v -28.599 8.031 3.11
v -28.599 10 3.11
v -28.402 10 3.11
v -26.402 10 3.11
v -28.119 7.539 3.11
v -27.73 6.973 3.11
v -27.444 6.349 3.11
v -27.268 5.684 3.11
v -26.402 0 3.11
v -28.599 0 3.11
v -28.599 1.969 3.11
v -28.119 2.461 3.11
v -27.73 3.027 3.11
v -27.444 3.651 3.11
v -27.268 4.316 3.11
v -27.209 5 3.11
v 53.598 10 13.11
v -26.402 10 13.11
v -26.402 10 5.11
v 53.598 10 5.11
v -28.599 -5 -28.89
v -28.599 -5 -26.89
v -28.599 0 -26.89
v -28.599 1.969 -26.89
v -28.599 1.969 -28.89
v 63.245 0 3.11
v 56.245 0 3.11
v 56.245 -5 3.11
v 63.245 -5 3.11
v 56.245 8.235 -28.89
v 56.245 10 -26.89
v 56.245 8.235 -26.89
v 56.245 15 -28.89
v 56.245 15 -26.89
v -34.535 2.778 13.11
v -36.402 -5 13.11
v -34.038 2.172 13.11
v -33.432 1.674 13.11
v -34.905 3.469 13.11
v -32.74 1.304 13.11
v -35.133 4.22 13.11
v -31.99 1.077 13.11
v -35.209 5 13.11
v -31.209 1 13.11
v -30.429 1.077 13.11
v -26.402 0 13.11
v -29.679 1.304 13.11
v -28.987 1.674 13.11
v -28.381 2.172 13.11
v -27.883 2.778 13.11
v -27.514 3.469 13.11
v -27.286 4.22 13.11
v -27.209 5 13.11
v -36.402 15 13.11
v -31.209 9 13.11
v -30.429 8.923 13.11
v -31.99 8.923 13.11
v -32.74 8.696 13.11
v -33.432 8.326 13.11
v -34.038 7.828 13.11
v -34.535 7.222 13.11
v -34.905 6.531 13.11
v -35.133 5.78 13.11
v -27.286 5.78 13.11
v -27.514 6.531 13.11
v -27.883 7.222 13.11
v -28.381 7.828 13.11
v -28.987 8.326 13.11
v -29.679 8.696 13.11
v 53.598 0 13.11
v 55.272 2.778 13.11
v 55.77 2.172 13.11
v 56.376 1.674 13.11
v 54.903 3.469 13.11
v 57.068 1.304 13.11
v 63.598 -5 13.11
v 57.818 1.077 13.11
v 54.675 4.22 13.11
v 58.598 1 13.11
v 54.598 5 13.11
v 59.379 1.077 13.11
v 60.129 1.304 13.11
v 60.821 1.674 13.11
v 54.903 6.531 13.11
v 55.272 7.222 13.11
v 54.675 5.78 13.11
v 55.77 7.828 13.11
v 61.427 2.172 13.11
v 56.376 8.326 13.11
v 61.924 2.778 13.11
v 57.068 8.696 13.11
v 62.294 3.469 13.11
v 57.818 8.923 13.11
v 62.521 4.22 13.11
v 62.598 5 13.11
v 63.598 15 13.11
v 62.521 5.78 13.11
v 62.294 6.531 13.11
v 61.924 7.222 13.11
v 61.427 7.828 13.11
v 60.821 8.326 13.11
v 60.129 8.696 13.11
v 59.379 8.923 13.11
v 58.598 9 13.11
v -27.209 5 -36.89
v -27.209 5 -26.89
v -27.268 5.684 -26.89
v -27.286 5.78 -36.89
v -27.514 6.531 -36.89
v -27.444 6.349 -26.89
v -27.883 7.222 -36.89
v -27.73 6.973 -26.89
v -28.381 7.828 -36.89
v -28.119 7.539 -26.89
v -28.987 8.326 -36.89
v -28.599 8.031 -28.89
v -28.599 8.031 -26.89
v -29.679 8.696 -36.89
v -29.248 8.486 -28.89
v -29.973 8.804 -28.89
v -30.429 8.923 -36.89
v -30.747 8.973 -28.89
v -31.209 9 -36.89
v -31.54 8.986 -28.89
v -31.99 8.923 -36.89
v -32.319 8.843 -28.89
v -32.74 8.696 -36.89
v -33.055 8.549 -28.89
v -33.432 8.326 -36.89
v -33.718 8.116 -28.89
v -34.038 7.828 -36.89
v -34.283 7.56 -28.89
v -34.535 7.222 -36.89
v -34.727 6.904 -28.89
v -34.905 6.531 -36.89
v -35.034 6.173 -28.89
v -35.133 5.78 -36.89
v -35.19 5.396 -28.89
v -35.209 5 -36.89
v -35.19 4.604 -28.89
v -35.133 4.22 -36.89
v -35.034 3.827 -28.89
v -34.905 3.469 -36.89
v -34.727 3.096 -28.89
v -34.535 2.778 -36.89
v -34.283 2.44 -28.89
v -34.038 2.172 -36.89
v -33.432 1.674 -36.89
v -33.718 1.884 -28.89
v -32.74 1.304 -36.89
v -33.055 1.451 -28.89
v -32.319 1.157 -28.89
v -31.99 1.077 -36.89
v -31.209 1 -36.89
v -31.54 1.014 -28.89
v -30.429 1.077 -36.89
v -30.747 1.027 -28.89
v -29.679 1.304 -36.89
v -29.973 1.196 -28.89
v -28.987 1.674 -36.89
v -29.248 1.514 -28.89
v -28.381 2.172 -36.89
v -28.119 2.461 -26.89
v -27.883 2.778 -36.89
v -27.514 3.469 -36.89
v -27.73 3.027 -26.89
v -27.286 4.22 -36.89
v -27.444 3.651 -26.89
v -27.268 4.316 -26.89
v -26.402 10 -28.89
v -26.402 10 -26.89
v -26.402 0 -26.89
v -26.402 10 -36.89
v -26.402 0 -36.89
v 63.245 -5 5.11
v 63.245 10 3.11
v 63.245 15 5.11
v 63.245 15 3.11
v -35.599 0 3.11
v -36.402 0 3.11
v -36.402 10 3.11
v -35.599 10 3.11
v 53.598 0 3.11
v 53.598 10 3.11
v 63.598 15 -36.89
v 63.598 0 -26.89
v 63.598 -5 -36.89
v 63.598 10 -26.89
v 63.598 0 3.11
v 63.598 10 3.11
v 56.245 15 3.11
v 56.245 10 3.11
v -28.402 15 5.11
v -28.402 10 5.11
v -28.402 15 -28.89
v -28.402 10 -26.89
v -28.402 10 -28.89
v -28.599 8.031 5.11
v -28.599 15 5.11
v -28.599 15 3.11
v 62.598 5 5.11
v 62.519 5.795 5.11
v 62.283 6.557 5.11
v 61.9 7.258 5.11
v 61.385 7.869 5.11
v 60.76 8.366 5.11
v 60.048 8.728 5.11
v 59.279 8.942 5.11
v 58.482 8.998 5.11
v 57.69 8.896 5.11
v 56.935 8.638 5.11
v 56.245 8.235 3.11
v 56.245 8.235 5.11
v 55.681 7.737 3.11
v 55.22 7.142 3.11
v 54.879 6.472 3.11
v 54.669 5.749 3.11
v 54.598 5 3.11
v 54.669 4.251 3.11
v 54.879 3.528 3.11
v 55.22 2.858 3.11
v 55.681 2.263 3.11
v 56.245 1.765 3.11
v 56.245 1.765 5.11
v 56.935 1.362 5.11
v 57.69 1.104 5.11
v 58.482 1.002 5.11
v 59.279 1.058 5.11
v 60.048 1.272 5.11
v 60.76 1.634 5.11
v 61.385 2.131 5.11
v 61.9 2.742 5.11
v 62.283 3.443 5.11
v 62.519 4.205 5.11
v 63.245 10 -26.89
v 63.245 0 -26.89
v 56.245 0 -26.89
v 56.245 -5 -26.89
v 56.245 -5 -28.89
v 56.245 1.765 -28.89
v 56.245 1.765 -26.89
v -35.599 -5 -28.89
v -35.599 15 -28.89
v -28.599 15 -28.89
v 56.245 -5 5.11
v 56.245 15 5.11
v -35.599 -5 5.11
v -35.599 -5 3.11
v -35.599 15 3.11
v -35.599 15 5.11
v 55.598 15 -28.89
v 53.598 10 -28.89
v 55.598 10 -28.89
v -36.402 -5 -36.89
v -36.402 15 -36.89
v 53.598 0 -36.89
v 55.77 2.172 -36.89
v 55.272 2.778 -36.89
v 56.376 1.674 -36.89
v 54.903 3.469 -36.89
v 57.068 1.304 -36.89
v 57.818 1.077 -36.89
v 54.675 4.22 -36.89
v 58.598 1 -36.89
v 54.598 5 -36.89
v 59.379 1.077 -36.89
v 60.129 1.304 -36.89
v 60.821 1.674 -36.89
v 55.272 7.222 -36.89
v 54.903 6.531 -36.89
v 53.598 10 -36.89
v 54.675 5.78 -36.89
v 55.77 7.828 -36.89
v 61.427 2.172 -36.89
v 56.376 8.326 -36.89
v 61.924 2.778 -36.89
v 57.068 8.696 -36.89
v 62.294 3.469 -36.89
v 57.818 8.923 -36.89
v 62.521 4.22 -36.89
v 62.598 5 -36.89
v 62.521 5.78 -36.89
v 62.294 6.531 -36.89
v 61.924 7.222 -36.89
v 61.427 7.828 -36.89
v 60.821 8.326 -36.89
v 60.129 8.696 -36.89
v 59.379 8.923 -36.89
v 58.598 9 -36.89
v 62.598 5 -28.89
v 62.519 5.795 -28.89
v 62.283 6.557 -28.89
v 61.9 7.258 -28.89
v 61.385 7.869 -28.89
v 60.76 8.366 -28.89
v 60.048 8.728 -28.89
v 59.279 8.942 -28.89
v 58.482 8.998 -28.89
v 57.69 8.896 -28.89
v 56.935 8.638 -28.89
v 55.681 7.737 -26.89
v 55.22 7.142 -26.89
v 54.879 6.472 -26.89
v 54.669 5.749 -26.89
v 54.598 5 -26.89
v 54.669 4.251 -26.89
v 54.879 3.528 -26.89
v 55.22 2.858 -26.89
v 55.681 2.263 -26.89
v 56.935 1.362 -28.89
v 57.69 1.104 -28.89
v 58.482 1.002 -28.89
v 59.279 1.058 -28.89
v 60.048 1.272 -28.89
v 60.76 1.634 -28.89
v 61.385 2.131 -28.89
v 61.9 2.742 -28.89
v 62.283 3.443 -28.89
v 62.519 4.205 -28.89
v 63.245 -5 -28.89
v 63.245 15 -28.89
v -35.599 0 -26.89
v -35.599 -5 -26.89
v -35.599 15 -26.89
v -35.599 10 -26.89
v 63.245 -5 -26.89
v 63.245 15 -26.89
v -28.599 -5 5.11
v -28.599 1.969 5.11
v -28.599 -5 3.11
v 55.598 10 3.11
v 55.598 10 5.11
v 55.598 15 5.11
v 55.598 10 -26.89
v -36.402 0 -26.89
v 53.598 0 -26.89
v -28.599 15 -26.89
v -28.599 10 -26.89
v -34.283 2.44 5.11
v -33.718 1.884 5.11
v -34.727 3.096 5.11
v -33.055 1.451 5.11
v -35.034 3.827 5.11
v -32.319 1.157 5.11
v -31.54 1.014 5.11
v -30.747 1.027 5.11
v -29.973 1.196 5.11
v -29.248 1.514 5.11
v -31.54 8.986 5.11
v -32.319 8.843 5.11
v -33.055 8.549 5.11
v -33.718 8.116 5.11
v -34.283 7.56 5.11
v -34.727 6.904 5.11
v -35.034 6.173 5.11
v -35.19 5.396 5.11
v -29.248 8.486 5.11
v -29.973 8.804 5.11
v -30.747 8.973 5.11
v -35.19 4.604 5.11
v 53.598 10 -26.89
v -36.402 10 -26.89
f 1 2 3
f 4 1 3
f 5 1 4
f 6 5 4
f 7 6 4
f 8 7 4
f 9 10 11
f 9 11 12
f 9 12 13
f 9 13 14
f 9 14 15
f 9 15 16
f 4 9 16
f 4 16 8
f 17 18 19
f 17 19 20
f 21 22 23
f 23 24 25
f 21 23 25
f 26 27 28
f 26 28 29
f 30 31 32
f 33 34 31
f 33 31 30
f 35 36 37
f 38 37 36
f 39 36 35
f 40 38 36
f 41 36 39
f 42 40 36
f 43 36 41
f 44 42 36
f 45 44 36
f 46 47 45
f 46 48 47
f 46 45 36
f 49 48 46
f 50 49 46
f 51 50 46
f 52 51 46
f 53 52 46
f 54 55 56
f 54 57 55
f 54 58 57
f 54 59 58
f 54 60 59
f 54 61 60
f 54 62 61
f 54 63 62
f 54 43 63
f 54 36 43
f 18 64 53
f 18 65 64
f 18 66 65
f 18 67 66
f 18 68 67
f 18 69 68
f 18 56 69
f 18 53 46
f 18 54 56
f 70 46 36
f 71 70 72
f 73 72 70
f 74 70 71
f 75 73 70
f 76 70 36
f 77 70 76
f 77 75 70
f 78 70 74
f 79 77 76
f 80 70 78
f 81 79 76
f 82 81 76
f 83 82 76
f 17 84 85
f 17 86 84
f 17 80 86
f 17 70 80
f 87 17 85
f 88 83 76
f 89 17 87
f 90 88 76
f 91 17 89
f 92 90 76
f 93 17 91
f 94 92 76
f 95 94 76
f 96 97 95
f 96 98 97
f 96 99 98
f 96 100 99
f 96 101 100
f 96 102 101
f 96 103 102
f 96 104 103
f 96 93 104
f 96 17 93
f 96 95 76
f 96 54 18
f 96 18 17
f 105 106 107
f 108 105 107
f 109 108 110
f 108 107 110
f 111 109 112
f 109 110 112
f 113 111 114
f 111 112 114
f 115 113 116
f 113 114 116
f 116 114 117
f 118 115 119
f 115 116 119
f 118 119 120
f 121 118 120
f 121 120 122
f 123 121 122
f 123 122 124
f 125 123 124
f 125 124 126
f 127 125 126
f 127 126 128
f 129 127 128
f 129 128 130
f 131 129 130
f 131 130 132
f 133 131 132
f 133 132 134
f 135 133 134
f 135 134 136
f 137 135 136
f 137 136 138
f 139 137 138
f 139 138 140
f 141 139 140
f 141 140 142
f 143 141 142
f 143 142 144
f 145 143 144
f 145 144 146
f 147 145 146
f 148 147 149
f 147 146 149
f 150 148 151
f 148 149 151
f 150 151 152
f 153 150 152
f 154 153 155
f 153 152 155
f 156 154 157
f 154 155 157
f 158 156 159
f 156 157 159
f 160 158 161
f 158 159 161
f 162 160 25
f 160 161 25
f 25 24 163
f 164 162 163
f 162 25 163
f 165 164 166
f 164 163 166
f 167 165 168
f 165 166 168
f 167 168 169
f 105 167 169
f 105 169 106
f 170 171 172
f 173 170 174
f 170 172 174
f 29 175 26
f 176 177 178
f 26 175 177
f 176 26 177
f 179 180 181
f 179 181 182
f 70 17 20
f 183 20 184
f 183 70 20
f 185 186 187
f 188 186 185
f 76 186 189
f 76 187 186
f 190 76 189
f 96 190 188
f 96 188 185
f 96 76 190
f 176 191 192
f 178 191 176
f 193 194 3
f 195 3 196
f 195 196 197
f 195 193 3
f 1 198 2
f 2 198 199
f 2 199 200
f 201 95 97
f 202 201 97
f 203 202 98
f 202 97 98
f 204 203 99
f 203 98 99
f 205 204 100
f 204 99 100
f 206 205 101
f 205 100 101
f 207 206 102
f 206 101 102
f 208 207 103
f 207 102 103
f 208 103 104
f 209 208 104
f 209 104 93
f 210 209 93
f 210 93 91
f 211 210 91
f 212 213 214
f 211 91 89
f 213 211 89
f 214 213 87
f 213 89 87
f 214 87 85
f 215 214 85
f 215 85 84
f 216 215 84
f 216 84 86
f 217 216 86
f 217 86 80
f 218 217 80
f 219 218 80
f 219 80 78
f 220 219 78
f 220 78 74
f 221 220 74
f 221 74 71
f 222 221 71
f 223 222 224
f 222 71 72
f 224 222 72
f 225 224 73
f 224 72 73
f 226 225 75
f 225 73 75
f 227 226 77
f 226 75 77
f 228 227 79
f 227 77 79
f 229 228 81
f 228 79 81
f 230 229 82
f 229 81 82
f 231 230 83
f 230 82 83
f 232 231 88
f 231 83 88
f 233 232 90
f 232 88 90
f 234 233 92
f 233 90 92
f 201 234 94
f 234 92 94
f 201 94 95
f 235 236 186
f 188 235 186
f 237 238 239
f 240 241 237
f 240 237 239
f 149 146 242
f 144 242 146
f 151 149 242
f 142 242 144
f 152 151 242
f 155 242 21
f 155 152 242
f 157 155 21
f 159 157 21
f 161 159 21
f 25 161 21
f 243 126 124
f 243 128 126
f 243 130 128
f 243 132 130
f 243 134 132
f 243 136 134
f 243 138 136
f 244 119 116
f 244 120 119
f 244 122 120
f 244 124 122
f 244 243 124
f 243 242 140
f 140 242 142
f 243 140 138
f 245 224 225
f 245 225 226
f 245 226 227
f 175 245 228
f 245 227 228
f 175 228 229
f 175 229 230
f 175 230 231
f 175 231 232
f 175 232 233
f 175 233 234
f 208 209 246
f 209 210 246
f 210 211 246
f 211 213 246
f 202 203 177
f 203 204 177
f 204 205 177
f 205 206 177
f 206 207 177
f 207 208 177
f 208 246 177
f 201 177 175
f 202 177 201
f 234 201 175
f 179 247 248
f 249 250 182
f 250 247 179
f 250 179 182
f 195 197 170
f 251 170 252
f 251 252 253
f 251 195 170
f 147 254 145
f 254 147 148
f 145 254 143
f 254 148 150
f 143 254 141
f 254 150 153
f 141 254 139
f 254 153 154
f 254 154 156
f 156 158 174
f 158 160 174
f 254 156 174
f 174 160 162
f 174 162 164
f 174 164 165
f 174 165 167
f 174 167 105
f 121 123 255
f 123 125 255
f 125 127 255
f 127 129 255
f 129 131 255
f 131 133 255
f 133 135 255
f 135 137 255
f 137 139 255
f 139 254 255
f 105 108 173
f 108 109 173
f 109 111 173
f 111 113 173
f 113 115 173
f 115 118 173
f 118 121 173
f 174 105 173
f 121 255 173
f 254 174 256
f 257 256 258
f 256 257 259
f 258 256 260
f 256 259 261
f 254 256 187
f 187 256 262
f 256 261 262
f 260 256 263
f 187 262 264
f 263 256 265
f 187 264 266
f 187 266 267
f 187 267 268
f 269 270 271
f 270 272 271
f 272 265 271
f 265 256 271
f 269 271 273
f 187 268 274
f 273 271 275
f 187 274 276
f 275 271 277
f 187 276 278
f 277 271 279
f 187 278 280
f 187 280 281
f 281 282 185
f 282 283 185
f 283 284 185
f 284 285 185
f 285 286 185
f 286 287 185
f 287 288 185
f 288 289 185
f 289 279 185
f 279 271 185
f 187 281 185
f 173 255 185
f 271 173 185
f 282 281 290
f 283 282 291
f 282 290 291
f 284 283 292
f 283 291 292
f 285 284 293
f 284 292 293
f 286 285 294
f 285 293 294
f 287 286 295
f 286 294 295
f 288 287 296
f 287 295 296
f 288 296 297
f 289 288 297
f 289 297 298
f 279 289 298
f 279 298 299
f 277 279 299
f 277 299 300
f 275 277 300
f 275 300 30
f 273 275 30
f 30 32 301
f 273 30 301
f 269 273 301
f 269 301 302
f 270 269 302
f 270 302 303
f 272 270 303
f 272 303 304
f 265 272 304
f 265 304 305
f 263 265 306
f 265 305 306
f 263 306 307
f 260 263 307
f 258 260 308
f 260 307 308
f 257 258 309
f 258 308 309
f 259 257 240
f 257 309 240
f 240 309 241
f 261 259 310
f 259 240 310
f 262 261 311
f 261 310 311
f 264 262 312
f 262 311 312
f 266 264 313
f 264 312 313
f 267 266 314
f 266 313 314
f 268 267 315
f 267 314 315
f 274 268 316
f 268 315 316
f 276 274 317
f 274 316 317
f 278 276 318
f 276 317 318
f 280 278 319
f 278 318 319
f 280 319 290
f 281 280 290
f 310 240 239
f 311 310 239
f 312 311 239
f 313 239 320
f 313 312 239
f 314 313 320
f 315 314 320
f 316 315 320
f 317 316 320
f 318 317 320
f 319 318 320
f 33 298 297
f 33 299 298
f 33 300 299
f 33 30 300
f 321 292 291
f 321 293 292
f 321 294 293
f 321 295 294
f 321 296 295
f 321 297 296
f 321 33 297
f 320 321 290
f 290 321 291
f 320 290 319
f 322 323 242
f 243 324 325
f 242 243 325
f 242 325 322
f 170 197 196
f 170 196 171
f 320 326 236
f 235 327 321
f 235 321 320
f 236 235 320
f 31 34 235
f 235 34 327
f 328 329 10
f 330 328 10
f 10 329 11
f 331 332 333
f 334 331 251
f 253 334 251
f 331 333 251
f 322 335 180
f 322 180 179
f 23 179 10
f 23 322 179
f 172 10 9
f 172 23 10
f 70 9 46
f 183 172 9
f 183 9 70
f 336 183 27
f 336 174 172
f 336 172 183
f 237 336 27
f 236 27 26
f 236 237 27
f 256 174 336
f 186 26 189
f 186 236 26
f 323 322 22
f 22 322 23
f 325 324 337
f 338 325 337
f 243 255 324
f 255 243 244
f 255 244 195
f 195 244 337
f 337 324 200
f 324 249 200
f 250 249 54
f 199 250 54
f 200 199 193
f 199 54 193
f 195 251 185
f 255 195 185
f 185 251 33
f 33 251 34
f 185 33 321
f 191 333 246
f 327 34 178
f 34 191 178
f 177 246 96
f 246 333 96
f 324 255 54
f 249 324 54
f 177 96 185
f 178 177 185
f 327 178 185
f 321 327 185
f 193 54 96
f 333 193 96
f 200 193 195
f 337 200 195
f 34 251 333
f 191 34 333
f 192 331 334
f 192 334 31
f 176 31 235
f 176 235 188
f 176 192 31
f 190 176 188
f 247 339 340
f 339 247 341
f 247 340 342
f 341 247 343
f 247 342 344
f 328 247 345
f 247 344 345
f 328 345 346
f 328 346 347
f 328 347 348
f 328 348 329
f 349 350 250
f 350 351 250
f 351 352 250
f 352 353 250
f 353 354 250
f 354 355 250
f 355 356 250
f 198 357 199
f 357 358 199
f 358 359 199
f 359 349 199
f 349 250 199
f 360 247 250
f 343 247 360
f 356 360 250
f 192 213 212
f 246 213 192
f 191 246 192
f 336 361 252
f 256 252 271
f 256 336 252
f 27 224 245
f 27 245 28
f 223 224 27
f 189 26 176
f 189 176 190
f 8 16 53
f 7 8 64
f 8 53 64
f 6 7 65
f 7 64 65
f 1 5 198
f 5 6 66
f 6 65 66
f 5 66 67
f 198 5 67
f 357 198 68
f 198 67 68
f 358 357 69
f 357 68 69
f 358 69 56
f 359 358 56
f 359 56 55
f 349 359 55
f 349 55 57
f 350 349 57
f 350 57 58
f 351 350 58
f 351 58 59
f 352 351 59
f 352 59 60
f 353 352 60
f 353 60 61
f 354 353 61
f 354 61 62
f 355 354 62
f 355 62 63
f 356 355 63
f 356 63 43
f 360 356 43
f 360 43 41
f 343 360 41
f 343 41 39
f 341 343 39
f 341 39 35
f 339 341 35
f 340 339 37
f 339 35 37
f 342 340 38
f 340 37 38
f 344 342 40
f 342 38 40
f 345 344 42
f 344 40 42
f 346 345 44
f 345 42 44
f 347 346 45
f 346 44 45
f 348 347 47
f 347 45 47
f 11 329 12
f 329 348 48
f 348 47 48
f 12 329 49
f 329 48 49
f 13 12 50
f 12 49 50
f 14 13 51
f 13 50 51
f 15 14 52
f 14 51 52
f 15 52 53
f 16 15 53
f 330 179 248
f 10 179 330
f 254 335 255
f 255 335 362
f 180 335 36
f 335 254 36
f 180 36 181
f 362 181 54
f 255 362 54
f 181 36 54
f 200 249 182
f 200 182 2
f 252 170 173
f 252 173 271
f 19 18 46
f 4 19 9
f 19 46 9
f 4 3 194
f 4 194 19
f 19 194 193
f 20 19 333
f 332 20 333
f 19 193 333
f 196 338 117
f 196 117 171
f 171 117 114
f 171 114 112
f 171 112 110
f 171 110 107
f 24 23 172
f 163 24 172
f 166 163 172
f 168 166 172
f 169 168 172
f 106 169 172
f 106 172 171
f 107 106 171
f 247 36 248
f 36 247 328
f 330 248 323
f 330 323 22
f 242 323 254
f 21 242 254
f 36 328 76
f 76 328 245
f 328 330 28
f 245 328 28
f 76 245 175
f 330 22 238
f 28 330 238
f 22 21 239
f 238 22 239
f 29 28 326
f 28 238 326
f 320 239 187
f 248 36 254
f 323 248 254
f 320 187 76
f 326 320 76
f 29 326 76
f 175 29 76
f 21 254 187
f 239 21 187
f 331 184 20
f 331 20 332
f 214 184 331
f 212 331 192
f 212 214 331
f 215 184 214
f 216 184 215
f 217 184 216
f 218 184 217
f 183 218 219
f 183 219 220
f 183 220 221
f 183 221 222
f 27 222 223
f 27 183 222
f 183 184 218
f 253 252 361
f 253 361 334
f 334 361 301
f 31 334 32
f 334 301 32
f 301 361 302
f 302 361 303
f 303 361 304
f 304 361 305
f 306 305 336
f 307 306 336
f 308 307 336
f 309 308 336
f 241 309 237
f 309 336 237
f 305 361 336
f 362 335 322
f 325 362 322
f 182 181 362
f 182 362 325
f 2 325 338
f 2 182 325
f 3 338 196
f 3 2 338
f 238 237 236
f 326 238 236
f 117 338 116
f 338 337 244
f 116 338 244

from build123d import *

# Parameters (mm, degrees)
SKETCH_1_W           = 10
SKETCH_1_H           = 10
EXTRUDE_2_DEPTH      = 10
EXTRUDE_2_2_DEPTH    = 10
EXTRUDE_2_3_DEPTH    = 10
EXTRUDE_2_4_DEPTH    = 10
SKETCH_2_W           = 100
SKETCH_2_H           = 50
EXTRUDE_3_DEPTH      = 5
SKETCH_4_W           = 100
SKETCH_4_H           = 5
EXTRUDE_4_DEPTH      = 50
SKETCH_7_R           = 4
CUT_EXTRUDE_7_DEPTH  = 100
SKETCH_8_W           = 84
SKETCH_8_H           = 34
CUT_EXTRUDE_9_DEPTH  = 5
CUT_EXTRUDE_12_REACH = 78.195
SKETCH_10_W          = 7
SKETCH_10_H          = 2
CUT_EXTRUDE_13_REACH = 78.195
SKETCH_12_W          = 7
SKETCH_12_H          = 2


with BuildPart() as part:
    # 草图1 → 凸台-拉伸2 (new body)
    with BuildSketch(Plane(origin=(0, 0, 0), x_dir=(1, 0, 0), z_dir=(0, 1, 0))):
        with Locations((-31.40167364, 31.889818689)):
            Rectangle(SKETCH_1_W, SKETCH_1_H)
    extrude(amount=EXTRUDE_2_DEPTH)



with BuildPart() as body_2:
    # 草图1 → Extrude 2 2 (new body)
    with BuildSketch(Plane(origin=(0, 0, 0), x_dir=(1, 0, 0), z_dir=(0, 1, 0))):
        with Locations((-31.40167364, -8.110181311)):
            Rectangle(SKETCH_1_W, SKETCH_1_H)
    extrude(amount=EXTRUDE_2_2_DEPTH)


with BuildPart() as body_3:
    # 草图1 → Extrude 2 3 (new body)
    with BuildSketch(Plane(origin=(0, 0, 0), x_dir=(1, 0, 0), z_dir=(0, 1, 0))):
        with Locations((58.59832636, 31.889818689)):
            Rectangle(SKETCH_1_W, SKETCH_1_H)
    extrude(amount=EXTRUDE_2_3_DEPTH)


with BuildPart() as body_4:
    # 草图1 → Extrude 2 4 (new body)
    with BuildSketch(Plane(origin=(0, 0, 0), x_dir=(1, 0, 0), z_dir=(0, 1, 0))):
        with Locations((58.59832636, -8.110181311)):
            Rectangle(SKETCH_1_W, SKETCH_1_H)
    extrude(amount=EXTRUDE_2_4_DEPTH)


with BuildPart() as part_1:
    add(part.part)

    add(body_2.part)  # 凸台-拉伸3 merges body 2

    add(body_3.part)  # 凸台-拉伸3 merges body 3

    add(body_4.part)  # 凸台-拉伸3 merges body 4
    # 草图2 → 凸台-拉伸3 (add)
    with BuildSketch(Plane(origin=(0, 0, 0), x_dir=(1, 0, 0), z_dir=(0, 1, 0))):
        with Locations((13.59832636, 11.889818689)):
            Rectangle(SKETCH_2_W, SKETCH_2_H)
    extrude(amount=-EXTRUDE_3_DEPTH)

    # 草图4 → 凸台-拉伸4 (add)
    with BuildSketch(Plane.XY.offset(13.110181311)):
        with Locations((13.59832636, 12.5)):
            Rectangle(SKETCH_4_W, SKETCH_4_H)
    extrude(amount=-EXTRUDE_4_DEPTH)

    # 草图7 → 切除-拉伸7 (cut)
    with BuildSketch(Plane.XY.offset(13.110181311)):
        with Locations((-31.20937541, 5)):
            Circle(SKETCH_7_R)
        with Locations((58.59832636, 5)):
            Circle(SKETCH_7_R)
    extrude(amount=-CUT_EXTRUDE_7_DEPTH, mode=Mode.SUBTRACT)

    # 草图8 → 切除-拉伸9 (cut)
    with BuildSketch(Plane(origin=(0, 15, 0), x_dir=(1, 0, 0), z_dir=(0, 1, 0))):
        with Locations((13.59832636, 11.889818689)):
            Rectangle(SKETCH_8_W, SKETCH_8_H)
    extrude(amount=-CUT_EXTRUDE_9_DEPTH, mode=Mode.SUBTRACT)

    # 草图10 → 切除-拉伸12 (cut, up to next)
    with BuildSketch(Plane(origin=(0, 15, 0), x_dir=(1, 0, 0), z_dir=(0, 1, 0)), mode=Mode.PRIVATE) as cut_extrude_12_sk1:
        with Locations((-32.098969847, 27.889818689)):
            Rectangle(SKETCH_10_W, SKETCH_10_H)
    cut_extrude_12_tool1 = extrude(cut_extrude_12_sk1.sketch, amount=-CUT_EXTRUDE_12_REACH, mode=Mode.PRIVATE) & part_1.part
    add(cut_extrude_12_tool1.solids().sort_by_distance((-32.09897, 15, -27.889819))[0], mode=Mode.SUBTRACT)

    # 草图12 → 切除-拉伸13 (cut, up to next)
    with BuildSketch(Plane(origin=(0, 15, 0), x_dir=(1, 0, 0), z_dir=(0, 1, 0)), mode=Mode.PRIVATE) as cut_extrude_13_sk1:
        with Locations((-32.098969847, -4.110181311)):
            Rectangle(SKETCH_12_W, SKETCH_12_H)
    cut_extrude_13_tool1 = extrude(cut_extrude_13_sk1.sketch, amount=-CUT_EXTRUDE_13_REACH, mode=Mode.PRIVATE) & part_1.part
    # 草图12 → 切除-拉伸13 (cut, up to next)
    with BuildSketch(Plane(origin=(0, 15, 0), x_dir=(1, 0, 0), z_dir=(0, 1, 0)), mode=Mode.PRIVATE) as cut_extrude_13_sk2:
        with Locations((59.745274347, 27.889818689)):
            Rectangle(SKETCH_12_W, SKETCH_12_H)
    cut_extrude_13_tool2 = extrude(cut_extrude_13_sk2.sketch, amount=-CUT_EXTRUDE_13_REACH, mode=Mode.PRIVATE) & part_1.part
    # 草图12 → 切除-拉伸13 (cut, up to next)
    with BuildSketch(Plane(origin=(0, 15, 0), x_dir=(1, 0, 0), z_dir=(0, 1, 0)), mode=Mode.PRIVATE) as cut_extrude_13_sk3:
        with Locations((59.745274347, -4.110181311)):
            Rectangle(SKETCH_12_W, SKETCH_12_H)
    cut_extrude_13_tool3 = extrude(cut_extrude_13_sk3.sketch, amount=-CUT_EXTRUDE_13_REACH, mode=Mode.PRIVATE) & part_1.part
    add(cut_extrude_13_tool1.solids().sort_by_distance((-32.09897, 15, 4.110181))[0], mode=Mode.SUBTRACT)
    add(cut_extrude_13_tool2.solids().sort_by_distance((59.745274, 15, -27.889819))[0], mode=Mode.SUBTRACT)
    add(cut_extrude_13_tool3.solids().sort_by_distance((59.745274, 15, 4.110181))[0], mode=Mode.SUBTRACT)


solid = part_1.part
